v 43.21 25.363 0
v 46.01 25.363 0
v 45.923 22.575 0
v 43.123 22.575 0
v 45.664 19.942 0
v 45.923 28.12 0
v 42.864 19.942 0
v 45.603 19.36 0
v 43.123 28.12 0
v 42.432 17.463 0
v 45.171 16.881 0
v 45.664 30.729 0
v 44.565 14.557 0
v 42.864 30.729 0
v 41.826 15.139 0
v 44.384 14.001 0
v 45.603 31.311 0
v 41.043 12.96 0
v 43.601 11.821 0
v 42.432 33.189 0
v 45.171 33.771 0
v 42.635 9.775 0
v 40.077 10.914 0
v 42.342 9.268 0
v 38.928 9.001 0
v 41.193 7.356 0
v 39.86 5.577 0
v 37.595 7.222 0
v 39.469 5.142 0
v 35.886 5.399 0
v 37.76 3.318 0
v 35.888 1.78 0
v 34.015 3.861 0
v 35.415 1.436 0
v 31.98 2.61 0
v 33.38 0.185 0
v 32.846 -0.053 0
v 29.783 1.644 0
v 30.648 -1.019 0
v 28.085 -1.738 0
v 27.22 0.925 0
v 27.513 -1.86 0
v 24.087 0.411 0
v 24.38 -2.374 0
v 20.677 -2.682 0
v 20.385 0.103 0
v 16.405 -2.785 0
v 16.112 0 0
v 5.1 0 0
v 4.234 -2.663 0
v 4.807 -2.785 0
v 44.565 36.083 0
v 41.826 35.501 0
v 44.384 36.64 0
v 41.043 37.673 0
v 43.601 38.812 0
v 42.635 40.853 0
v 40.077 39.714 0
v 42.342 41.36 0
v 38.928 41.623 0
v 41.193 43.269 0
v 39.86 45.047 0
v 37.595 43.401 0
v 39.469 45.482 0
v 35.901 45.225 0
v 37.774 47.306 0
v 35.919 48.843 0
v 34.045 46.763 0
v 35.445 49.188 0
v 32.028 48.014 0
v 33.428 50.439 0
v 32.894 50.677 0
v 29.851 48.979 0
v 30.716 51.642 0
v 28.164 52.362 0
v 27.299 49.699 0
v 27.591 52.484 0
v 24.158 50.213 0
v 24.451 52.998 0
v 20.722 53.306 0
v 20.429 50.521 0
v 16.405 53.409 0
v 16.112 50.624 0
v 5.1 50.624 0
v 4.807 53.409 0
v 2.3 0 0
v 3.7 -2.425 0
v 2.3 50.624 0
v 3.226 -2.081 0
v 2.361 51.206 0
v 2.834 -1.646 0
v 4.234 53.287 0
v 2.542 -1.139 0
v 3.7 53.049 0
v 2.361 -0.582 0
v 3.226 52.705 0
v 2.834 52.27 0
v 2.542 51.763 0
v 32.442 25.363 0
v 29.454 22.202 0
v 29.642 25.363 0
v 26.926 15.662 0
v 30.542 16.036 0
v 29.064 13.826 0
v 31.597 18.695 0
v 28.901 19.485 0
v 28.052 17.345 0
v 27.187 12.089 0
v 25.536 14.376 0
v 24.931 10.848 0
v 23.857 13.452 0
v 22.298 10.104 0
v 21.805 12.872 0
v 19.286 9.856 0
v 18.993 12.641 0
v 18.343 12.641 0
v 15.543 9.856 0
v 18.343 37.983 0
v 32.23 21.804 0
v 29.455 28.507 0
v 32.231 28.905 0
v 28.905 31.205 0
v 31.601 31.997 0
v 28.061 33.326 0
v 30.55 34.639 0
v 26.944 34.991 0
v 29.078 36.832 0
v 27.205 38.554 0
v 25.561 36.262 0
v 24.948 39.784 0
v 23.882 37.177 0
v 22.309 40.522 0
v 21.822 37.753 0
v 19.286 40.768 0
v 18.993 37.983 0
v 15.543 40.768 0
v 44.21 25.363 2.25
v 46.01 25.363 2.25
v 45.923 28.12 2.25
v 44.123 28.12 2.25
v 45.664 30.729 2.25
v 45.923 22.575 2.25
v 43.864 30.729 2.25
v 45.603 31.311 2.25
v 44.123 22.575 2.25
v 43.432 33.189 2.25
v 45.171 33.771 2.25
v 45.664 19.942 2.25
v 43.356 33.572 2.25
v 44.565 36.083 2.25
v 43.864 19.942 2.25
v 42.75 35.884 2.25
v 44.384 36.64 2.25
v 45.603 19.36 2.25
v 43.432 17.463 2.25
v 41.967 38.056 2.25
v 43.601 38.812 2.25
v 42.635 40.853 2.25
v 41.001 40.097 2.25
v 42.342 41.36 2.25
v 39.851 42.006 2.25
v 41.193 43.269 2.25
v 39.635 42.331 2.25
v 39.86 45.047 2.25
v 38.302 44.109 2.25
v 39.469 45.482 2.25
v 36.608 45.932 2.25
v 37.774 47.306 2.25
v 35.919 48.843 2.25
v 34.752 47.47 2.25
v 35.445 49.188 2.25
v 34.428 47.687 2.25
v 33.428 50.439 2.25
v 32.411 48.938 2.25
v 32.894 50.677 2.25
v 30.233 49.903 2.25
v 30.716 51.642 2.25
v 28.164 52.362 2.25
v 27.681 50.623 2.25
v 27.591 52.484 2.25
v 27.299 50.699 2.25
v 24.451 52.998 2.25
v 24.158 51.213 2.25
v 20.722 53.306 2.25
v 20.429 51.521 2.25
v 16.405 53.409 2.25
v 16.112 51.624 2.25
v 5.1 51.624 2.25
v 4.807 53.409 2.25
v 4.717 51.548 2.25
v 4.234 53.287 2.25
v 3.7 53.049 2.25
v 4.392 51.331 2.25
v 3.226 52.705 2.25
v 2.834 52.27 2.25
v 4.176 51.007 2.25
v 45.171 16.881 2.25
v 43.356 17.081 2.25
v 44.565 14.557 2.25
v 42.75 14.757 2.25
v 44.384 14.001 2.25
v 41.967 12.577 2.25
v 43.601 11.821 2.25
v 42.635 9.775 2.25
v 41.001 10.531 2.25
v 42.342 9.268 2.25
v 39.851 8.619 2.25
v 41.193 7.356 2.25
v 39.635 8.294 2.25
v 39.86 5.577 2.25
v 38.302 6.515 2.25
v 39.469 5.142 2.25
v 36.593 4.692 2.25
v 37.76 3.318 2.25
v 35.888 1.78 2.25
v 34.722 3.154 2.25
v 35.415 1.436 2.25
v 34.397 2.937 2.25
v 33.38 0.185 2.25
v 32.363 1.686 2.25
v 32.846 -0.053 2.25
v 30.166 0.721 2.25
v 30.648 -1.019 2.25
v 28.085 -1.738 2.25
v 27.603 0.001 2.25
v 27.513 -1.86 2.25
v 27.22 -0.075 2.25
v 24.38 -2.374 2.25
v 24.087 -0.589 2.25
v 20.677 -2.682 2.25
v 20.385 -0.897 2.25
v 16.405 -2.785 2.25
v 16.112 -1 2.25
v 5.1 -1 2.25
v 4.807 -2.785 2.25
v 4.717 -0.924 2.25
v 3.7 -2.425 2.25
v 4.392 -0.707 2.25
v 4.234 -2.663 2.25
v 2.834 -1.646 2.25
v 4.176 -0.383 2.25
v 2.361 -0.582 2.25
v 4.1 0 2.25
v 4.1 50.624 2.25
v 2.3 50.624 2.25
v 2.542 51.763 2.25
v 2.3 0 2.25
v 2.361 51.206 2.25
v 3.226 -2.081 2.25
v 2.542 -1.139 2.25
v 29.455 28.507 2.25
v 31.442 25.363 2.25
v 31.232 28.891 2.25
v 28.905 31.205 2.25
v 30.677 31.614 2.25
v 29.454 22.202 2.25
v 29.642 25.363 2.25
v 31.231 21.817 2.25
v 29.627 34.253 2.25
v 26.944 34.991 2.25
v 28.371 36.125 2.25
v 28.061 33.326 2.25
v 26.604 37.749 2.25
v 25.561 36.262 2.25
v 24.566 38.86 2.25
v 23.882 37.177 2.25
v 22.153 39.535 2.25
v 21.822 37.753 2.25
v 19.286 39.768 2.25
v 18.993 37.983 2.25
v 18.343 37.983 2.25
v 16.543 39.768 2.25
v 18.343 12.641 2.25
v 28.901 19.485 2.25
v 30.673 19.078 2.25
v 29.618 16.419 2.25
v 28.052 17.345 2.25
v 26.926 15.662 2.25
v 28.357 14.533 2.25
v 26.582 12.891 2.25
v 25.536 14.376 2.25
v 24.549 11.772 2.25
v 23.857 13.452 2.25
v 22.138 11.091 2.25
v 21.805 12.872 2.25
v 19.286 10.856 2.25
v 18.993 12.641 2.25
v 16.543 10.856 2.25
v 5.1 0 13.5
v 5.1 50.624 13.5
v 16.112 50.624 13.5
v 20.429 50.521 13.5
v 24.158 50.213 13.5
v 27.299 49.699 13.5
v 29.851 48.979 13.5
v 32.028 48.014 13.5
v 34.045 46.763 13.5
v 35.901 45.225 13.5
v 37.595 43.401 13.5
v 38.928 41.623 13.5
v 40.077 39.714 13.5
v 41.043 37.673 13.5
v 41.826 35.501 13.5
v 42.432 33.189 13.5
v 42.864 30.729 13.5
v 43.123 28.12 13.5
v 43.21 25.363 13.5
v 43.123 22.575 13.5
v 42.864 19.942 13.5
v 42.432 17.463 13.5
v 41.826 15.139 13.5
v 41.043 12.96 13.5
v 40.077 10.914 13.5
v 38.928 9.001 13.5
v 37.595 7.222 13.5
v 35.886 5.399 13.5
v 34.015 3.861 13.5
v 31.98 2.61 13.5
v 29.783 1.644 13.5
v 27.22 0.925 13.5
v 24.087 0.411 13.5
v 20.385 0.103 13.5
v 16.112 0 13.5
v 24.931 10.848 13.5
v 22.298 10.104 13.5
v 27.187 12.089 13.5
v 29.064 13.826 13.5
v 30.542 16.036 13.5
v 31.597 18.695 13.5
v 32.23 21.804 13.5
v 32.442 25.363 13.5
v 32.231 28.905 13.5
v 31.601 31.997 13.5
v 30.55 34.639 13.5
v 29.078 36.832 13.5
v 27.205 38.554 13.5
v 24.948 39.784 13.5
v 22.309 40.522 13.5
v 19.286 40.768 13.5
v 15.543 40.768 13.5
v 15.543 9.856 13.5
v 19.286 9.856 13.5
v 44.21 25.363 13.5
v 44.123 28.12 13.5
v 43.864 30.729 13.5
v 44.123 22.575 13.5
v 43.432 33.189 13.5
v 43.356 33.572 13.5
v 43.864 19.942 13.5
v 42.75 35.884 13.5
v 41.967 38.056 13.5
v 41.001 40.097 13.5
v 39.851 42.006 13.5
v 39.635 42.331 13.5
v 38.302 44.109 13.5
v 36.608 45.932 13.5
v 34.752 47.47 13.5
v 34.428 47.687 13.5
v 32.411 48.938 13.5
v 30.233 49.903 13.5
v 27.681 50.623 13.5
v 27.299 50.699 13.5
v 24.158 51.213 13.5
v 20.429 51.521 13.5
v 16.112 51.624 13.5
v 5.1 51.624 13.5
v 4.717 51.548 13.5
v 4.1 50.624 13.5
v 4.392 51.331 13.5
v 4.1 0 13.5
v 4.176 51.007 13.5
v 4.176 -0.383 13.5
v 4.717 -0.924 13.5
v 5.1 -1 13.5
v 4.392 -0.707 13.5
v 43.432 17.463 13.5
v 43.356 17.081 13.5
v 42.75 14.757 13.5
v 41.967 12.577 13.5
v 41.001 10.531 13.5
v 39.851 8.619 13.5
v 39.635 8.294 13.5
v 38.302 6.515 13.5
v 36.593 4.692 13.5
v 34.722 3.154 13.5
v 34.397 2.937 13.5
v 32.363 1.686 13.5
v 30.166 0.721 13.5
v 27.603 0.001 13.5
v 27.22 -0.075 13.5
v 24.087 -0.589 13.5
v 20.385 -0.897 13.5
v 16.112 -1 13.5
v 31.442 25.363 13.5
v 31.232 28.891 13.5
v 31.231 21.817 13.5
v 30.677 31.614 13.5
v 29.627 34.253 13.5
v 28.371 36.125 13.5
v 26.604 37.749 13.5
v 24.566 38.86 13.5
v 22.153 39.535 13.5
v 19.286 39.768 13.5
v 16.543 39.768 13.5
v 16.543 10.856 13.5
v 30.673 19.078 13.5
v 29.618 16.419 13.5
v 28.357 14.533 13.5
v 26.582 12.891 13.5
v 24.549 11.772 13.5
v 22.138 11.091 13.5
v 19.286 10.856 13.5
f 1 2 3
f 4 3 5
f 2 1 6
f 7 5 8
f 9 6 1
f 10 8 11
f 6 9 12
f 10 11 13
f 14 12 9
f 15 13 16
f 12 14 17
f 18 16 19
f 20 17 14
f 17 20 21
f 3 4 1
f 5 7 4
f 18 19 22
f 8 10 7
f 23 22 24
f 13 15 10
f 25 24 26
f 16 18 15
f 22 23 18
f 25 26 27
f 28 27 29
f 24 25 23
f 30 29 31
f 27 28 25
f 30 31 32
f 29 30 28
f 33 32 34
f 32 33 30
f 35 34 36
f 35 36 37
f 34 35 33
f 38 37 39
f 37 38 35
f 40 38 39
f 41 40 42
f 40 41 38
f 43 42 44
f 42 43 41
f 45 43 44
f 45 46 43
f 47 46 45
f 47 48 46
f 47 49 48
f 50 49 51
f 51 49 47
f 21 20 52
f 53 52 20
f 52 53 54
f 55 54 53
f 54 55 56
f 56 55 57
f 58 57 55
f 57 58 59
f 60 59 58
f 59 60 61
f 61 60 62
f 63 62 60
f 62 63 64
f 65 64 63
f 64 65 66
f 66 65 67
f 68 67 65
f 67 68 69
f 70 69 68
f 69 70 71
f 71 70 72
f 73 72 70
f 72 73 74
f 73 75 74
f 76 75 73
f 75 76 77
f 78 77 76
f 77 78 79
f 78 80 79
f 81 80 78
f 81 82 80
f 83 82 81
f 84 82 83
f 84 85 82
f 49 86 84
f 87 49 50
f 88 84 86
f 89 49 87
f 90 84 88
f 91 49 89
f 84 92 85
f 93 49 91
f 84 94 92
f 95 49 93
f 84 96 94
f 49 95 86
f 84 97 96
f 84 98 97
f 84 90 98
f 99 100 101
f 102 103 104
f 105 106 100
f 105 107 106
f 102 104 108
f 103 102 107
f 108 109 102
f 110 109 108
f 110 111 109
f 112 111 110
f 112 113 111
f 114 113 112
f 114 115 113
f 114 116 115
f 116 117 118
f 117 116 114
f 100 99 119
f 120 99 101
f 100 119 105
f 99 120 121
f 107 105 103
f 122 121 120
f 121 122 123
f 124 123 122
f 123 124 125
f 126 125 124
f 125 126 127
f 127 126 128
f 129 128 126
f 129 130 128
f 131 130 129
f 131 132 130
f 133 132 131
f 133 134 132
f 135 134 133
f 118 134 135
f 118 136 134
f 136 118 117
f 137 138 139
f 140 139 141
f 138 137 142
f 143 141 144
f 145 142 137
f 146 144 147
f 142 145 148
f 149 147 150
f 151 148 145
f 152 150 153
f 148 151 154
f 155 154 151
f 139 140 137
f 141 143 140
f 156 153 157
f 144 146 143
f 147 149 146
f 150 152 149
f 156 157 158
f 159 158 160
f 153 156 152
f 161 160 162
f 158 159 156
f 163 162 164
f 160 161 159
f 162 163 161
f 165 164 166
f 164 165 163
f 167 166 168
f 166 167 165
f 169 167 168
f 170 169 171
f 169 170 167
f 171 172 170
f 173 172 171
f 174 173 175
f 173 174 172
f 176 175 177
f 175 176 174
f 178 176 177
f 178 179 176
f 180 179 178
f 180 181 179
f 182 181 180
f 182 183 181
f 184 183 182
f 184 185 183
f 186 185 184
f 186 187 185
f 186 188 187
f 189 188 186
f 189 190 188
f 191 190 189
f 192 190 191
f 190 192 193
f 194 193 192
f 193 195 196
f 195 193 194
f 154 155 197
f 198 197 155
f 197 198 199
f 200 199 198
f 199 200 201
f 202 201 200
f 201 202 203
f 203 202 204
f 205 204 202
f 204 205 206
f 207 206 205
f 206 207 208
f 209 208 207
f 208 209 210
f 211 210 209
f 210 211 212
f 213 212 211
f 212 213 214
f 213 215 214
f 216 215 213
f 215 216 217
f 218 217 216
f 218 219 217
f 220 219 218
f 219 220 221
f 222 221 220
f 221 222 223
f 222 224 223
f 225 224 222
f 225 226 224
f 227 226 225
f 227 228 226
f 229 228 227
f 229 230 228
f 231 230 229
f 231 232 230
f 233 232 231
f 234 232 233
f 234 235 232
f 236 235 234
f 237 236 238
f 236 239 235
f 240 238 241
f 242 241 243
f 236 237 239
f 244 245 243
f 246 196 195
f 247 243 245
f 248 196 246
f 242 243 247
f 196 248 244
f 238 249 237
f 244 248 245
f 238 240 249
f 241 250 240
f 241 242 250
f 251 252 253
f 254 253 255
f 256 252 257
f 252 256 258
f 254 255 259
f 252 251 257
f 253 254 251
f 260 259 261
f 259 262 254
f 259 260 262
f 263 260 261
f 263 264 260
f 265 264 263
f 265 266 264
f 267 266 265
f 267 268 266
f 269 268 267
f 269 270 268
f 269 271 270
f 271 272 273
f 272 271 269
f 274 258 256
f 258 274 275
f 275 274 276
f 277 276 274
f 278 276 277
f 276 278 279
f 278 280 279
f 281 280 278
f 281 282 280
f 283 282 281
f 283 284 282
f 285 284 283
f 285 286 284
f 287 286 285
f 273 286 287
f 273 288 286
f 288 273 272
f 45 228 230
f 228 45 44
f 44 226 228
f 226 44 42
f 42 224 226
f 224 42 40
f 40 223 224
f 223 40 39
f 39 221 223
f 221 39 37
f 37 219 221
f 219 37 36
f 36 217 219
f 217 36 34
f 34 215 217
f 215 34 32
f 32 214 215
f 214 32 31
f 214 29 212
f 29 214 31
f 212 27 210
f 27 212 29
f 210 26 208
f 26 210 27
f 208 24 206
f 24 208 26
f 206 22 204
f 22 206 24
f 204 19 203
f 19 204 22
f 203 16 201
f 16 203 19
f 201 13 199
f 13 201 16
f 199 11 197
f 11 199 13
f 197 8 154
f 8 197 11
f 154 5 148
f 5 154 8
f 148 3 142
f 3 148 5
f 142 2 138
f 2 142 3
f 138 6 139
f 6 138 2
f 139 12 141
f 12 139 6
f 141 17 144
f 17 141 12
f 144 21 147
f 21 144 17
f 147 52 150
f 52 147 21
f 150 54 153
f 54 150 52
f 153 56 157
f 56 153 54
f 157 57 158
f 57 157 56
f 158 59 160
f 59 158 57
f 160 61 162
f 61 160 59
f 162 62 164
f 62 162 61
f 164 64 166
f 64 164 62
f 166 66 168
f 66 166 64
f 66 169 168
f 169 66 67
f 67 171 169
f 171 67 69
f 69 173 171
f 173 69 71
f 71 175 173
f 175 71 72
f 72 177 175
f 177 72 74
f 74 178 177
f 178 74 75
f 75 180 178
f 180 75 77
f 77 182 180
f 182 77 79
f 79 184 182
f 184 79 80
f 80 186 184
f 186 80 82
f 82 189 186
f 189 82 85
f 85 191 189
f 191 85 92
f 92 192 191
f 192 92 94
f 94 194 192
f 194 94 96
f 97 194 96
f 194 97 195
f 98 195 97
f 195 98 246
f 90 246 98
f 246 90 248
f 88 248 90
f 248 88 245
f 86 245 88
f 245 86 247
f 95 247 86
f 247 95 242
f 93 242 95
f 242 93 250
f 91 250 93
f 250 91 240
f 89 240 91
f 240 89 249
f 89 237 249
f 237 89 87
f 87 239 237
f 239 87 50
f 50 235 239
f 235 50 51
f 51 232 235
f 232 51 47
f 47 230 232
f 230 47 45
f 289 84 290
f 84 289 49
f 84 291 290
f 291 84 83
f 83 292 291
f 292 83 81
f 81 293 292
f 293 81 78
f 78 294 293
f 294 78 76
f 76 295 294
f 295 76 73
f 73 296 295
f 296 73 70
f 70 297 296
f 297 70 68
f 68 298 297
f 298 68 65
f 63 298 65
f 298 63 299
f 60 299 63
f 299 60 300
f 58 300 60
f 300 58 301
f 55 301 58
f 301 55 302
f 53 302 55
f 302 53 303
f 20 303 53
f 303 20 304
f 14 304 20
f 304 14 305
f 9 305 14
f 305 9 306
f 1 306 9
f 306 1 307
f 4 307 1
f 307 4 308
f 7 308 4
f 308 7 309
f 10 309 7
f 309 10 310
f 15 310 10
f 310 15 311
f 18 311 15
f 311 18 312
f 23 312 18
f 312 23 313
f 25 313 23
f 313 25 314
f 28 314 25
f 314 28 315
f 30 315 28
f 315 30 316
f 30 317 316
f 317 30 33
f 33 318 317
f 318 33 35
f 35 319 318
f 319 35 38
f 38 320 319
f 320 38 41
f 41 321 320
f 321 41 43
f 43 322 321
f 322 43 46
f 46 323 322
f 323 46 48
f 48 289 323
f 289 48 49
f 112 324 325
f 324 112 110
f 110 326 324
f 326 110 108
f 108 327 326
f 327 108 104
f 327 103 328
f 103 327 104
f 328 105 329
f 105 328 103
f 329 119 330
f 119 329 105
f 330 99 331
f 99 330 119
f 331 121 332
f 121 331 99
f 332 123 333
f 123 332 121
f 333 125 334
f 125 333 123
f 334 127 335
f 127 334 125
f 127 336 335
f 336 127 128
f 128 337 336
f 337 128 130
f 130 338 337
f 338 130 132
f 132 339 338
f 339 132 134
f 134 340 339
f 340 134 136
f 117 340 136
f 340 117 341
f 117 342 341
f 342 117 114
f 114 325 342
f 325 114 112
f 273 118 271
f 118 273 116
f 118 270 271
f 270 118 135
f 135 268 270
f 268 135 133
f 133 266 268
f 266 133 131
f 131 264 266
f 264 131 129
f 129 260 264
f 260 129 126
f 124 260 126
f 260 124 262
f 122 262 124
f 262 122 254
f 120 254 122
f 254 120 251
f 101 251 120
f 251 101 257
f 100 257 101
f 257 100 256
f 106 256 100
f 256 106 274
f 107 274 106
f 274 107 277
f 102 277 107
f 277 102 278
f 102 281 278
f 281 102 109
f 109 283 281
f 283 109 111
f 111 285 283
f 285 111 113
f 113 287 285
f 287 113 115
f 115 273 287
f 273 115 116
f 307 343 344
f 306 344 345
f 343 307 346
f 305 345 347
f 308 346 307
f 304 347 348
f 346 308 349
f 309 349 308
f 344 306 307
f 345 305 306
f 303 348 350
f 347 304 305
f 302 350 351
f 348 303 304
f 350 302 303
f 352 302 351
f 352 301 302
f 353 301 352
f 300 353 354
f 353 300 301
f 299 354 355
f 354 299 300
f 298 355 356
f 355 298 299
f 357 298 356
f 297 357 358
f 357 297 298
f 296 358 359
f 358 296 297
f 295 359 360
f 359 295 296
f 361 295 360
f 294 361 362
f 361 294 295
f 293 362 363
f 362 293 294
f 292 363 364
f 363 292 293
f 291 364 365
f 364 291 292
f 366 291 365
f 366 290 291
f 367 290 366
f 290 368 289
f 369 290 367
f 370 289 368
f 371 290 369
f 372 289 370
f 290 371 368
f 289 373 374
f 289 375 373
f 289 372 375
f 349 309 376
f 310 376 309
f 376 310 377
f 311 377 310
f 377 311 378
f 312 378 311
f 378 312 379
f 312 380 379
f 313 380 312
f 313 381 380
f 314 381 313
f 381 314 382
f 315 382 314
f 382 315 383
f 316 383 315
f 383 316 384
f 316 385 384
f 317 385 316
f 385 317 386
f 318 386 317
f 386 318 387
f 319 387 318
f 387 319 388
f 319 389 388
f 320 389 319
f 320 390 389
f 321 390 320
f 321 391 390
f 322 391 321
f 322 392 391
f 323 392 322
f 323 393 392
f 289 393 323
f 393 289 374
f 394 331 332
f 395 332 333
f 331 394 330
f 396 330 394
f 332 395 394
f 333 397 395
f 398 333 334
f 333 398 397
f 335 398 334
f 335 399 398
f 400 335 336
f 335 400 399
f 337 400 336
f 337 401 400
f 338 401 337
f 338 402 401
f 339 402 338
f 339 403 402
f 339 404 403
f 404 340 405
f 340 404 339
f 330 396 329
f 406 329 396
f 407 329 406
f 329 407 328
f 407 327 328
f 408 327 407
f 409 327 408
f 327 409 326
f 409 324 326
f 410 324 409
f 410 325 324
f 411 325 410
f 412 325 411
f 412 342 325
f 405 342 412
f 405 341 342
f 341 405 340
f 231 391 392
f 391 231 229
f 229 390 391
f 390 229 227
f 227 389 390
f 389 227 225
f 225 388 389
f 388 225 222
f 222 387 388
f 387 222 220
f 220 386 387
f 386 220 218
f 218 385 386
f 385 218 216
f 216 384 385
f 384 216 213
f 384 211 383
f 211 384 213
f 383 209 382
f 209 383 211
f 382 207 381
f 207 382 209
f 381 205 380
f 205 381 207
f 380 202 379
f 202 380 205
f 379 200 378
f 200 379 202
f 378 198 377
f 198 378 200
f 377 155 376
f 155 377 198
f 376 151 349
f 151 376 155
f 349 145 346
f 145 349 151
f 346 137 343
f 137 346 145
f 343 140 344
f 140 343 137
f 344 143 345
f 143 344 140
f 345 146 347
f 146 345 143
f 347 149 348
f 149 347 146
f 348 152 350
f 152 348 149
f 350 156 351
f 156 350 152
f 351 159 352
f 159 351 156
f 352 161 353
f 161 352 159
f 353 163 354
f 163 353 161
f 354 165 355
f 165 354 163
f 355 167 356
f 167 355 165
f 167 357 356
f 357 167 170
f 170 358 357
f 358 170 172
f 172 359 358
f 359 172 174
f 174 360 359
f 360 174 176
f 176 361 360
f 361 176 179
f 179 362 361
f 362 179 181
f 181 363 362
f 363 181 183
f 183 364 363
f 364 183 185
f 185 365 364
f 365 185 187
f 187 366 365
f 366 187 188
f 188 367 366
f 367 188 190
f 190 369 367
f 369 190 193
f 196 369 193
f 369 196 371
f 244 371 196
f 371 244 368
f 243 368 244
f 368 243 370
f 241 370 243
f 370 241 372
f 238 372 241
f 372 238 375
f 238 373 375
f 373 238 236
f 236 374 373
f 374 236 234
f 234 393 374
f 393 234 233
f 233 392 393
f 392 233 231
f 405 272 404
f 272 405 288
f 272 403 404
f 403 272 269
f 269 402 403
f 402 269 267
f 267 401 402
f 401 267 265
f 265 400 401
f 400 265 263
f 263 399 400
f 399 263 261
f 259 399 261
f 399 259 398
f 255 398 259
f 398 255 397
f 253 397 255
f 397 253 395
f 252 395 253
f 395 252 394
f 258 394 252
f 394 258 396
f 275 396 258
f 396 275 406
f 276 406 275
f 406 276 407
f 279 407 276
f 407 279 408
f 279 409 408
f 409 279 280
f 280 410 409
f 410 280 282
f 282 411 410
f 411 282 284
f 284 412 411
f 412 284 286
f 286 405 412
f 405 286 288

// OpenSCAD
// file: Common.scad
module offset_shell(thickness = 0.1) {
  render() {
      difference() {
          minkowski() {
            children();
            circle(2* thickness, center=true);
          }
        children();
      }
   }
}

module cookie_cutter(handle_thickness=8, cutter_tickness=3, total_height=15) {
    union() {
        linear_extrude(height = total_height*(0.15), slices = 60) {
            scale([.2,.2,1]) {
              offset_shell(handle_thickness) {
                children();

              }
            }
        };
        linear_extrude(height = total_height*(0.9), slices = 60)
            translate([0,0,2])
            scale([.2,.2,1]) {
              offset_shell(cutter_tickness) {
                children();
            }
        };
    }
}

module rod_with_clipped_circle(square_d, circle_d, circle_placement) {
    difference() {
        square(square_d, center=true);
        translate(circle_placement) circle(circle_d, center=true);
    }
}

//module cookie_press(handle_thickness=2.5, cutter_tickness=1, total_height=10) {
//    union() {
//        cookie_cutter(handle_thickness, cutter_tickness, total_height);
//        translate([0,0,10]) children();
//    }
//}
//
//
// file: ../ComplexShapes.scad
include <BasicShapes.scad>

module HalfCylinder(r, h, e=1, center=false) {
    translate([0,0, center ? -h/2 : 0])difference(){
        cylinder(h,r,r);
        translate([0,-r,-e])cube([2*r,2*r,h+2*e]);
    }
}

module HalfCircle(r) {
    difference(){
        circle(r);
        translate([-r,-2*r,0]) square(2*r);
    }
}

module Crescent(r, fatten_scale=1, curve_angle=0, rotate=0) {
    r_prime = r / fatten_scale;
    rotate([0,0,rotate]) difference() {
        circle(r_prime*1.1);
        translate([r_prime/4, curve_angle*r_prime/4, 0]) circle(r_prime*fatten_scale);
    }
}


module round_edges(r) {
    minkowski() {
        children();
        circle(r);
    };
}

module CrescentV2(outer_r, inner_r, r_shift, edge_rounding=2) {
    // Different way to construct ... rounded edges ...
   round_edges(edge_rounding) {
        difference() {
            circle(outer_r);
            translate(r_shift) circle(inner_r);
        };
    };
}


//module Arch(x,y,r) {
//    // http://kitwallace.co.uk/Blog/item/2013-01-28T17:59:00Z
//    union() {
//        intersection() {
//           translate([x,y,0]) circle(r);
//           translate([-x,y,0]) circle(r);
//        }
//        translate([0,y/2,0]) square(size=[2 * (r-x), y], center=true);
//    }
//}

module Arch(width, arc_height, strech_height=0) {
    // http://kitwallace.co.uk/Blog/item/2013-01-28T17:59:00Z
    r = arc_height;
    x = (width / 2) - r;
    y = arc_height + strech_height;
    union() {
        intersection() {
           translate([x,y,0]) circle(r);
           translate([-x,y,0]) circle(r);
        }
        translate([0,y/2,0]) square(size=[width, y], center=true);
    }
}
// file: ../BasicShapes.scad
module Star(points, outer, inner_defaulted=0) {
    inner = inner_defaulted == 0 ? 2 * outer  : inner_defaulted;
	// polar to cartesian: radius/angle to x/y
	function x(r, a) = r * cos(a);
	function y(r, a) = r * sin(a);
	
	// angular width of each pie slice of the star
	increment = 360/points;
	
	union() {
		for (p = [0 : points-1]) {
			
			// outer is outer point p
			// inner is inner point following p
			// next is next outer point following p

			assign(	
                x_outer = x(outer, increment * p),
                y_outer = y(outer, increment * p),
                x_inner = x(inner, (increment * p) + (increment/2)),
                y_inner = y(inner, (increment * p) + (increment/2)),
                x_next  = x(outer, increment * (p+1)),
                y_next  = y(outer, increment * (p+1))
            ) {
				polygon(
                    points = [
                        [x_outer, y_outer], 
                        [x_inner, y_inner],
                        [x_next, y_next], 
                        [0, 0]
                    ], 
                    paths  = [[0, 1, 2, 3]]
                );
			}
		}
	}
}

//https://github.com/openscad/MCAD/blob/master/shapes.scad
module Hexagon(size) {
  Star(3, size, size);
}

module Octagon(size) {
  Star(4, size, size);
}
// main file
include <../BasicShapes.scad>
include <../ComplexShapes.scad>
include <Common.scad>

cookie_cutter(7,2.5,15) {
    scale([20,25,1]) text("D", font = "Tre:style=Bold");
}
